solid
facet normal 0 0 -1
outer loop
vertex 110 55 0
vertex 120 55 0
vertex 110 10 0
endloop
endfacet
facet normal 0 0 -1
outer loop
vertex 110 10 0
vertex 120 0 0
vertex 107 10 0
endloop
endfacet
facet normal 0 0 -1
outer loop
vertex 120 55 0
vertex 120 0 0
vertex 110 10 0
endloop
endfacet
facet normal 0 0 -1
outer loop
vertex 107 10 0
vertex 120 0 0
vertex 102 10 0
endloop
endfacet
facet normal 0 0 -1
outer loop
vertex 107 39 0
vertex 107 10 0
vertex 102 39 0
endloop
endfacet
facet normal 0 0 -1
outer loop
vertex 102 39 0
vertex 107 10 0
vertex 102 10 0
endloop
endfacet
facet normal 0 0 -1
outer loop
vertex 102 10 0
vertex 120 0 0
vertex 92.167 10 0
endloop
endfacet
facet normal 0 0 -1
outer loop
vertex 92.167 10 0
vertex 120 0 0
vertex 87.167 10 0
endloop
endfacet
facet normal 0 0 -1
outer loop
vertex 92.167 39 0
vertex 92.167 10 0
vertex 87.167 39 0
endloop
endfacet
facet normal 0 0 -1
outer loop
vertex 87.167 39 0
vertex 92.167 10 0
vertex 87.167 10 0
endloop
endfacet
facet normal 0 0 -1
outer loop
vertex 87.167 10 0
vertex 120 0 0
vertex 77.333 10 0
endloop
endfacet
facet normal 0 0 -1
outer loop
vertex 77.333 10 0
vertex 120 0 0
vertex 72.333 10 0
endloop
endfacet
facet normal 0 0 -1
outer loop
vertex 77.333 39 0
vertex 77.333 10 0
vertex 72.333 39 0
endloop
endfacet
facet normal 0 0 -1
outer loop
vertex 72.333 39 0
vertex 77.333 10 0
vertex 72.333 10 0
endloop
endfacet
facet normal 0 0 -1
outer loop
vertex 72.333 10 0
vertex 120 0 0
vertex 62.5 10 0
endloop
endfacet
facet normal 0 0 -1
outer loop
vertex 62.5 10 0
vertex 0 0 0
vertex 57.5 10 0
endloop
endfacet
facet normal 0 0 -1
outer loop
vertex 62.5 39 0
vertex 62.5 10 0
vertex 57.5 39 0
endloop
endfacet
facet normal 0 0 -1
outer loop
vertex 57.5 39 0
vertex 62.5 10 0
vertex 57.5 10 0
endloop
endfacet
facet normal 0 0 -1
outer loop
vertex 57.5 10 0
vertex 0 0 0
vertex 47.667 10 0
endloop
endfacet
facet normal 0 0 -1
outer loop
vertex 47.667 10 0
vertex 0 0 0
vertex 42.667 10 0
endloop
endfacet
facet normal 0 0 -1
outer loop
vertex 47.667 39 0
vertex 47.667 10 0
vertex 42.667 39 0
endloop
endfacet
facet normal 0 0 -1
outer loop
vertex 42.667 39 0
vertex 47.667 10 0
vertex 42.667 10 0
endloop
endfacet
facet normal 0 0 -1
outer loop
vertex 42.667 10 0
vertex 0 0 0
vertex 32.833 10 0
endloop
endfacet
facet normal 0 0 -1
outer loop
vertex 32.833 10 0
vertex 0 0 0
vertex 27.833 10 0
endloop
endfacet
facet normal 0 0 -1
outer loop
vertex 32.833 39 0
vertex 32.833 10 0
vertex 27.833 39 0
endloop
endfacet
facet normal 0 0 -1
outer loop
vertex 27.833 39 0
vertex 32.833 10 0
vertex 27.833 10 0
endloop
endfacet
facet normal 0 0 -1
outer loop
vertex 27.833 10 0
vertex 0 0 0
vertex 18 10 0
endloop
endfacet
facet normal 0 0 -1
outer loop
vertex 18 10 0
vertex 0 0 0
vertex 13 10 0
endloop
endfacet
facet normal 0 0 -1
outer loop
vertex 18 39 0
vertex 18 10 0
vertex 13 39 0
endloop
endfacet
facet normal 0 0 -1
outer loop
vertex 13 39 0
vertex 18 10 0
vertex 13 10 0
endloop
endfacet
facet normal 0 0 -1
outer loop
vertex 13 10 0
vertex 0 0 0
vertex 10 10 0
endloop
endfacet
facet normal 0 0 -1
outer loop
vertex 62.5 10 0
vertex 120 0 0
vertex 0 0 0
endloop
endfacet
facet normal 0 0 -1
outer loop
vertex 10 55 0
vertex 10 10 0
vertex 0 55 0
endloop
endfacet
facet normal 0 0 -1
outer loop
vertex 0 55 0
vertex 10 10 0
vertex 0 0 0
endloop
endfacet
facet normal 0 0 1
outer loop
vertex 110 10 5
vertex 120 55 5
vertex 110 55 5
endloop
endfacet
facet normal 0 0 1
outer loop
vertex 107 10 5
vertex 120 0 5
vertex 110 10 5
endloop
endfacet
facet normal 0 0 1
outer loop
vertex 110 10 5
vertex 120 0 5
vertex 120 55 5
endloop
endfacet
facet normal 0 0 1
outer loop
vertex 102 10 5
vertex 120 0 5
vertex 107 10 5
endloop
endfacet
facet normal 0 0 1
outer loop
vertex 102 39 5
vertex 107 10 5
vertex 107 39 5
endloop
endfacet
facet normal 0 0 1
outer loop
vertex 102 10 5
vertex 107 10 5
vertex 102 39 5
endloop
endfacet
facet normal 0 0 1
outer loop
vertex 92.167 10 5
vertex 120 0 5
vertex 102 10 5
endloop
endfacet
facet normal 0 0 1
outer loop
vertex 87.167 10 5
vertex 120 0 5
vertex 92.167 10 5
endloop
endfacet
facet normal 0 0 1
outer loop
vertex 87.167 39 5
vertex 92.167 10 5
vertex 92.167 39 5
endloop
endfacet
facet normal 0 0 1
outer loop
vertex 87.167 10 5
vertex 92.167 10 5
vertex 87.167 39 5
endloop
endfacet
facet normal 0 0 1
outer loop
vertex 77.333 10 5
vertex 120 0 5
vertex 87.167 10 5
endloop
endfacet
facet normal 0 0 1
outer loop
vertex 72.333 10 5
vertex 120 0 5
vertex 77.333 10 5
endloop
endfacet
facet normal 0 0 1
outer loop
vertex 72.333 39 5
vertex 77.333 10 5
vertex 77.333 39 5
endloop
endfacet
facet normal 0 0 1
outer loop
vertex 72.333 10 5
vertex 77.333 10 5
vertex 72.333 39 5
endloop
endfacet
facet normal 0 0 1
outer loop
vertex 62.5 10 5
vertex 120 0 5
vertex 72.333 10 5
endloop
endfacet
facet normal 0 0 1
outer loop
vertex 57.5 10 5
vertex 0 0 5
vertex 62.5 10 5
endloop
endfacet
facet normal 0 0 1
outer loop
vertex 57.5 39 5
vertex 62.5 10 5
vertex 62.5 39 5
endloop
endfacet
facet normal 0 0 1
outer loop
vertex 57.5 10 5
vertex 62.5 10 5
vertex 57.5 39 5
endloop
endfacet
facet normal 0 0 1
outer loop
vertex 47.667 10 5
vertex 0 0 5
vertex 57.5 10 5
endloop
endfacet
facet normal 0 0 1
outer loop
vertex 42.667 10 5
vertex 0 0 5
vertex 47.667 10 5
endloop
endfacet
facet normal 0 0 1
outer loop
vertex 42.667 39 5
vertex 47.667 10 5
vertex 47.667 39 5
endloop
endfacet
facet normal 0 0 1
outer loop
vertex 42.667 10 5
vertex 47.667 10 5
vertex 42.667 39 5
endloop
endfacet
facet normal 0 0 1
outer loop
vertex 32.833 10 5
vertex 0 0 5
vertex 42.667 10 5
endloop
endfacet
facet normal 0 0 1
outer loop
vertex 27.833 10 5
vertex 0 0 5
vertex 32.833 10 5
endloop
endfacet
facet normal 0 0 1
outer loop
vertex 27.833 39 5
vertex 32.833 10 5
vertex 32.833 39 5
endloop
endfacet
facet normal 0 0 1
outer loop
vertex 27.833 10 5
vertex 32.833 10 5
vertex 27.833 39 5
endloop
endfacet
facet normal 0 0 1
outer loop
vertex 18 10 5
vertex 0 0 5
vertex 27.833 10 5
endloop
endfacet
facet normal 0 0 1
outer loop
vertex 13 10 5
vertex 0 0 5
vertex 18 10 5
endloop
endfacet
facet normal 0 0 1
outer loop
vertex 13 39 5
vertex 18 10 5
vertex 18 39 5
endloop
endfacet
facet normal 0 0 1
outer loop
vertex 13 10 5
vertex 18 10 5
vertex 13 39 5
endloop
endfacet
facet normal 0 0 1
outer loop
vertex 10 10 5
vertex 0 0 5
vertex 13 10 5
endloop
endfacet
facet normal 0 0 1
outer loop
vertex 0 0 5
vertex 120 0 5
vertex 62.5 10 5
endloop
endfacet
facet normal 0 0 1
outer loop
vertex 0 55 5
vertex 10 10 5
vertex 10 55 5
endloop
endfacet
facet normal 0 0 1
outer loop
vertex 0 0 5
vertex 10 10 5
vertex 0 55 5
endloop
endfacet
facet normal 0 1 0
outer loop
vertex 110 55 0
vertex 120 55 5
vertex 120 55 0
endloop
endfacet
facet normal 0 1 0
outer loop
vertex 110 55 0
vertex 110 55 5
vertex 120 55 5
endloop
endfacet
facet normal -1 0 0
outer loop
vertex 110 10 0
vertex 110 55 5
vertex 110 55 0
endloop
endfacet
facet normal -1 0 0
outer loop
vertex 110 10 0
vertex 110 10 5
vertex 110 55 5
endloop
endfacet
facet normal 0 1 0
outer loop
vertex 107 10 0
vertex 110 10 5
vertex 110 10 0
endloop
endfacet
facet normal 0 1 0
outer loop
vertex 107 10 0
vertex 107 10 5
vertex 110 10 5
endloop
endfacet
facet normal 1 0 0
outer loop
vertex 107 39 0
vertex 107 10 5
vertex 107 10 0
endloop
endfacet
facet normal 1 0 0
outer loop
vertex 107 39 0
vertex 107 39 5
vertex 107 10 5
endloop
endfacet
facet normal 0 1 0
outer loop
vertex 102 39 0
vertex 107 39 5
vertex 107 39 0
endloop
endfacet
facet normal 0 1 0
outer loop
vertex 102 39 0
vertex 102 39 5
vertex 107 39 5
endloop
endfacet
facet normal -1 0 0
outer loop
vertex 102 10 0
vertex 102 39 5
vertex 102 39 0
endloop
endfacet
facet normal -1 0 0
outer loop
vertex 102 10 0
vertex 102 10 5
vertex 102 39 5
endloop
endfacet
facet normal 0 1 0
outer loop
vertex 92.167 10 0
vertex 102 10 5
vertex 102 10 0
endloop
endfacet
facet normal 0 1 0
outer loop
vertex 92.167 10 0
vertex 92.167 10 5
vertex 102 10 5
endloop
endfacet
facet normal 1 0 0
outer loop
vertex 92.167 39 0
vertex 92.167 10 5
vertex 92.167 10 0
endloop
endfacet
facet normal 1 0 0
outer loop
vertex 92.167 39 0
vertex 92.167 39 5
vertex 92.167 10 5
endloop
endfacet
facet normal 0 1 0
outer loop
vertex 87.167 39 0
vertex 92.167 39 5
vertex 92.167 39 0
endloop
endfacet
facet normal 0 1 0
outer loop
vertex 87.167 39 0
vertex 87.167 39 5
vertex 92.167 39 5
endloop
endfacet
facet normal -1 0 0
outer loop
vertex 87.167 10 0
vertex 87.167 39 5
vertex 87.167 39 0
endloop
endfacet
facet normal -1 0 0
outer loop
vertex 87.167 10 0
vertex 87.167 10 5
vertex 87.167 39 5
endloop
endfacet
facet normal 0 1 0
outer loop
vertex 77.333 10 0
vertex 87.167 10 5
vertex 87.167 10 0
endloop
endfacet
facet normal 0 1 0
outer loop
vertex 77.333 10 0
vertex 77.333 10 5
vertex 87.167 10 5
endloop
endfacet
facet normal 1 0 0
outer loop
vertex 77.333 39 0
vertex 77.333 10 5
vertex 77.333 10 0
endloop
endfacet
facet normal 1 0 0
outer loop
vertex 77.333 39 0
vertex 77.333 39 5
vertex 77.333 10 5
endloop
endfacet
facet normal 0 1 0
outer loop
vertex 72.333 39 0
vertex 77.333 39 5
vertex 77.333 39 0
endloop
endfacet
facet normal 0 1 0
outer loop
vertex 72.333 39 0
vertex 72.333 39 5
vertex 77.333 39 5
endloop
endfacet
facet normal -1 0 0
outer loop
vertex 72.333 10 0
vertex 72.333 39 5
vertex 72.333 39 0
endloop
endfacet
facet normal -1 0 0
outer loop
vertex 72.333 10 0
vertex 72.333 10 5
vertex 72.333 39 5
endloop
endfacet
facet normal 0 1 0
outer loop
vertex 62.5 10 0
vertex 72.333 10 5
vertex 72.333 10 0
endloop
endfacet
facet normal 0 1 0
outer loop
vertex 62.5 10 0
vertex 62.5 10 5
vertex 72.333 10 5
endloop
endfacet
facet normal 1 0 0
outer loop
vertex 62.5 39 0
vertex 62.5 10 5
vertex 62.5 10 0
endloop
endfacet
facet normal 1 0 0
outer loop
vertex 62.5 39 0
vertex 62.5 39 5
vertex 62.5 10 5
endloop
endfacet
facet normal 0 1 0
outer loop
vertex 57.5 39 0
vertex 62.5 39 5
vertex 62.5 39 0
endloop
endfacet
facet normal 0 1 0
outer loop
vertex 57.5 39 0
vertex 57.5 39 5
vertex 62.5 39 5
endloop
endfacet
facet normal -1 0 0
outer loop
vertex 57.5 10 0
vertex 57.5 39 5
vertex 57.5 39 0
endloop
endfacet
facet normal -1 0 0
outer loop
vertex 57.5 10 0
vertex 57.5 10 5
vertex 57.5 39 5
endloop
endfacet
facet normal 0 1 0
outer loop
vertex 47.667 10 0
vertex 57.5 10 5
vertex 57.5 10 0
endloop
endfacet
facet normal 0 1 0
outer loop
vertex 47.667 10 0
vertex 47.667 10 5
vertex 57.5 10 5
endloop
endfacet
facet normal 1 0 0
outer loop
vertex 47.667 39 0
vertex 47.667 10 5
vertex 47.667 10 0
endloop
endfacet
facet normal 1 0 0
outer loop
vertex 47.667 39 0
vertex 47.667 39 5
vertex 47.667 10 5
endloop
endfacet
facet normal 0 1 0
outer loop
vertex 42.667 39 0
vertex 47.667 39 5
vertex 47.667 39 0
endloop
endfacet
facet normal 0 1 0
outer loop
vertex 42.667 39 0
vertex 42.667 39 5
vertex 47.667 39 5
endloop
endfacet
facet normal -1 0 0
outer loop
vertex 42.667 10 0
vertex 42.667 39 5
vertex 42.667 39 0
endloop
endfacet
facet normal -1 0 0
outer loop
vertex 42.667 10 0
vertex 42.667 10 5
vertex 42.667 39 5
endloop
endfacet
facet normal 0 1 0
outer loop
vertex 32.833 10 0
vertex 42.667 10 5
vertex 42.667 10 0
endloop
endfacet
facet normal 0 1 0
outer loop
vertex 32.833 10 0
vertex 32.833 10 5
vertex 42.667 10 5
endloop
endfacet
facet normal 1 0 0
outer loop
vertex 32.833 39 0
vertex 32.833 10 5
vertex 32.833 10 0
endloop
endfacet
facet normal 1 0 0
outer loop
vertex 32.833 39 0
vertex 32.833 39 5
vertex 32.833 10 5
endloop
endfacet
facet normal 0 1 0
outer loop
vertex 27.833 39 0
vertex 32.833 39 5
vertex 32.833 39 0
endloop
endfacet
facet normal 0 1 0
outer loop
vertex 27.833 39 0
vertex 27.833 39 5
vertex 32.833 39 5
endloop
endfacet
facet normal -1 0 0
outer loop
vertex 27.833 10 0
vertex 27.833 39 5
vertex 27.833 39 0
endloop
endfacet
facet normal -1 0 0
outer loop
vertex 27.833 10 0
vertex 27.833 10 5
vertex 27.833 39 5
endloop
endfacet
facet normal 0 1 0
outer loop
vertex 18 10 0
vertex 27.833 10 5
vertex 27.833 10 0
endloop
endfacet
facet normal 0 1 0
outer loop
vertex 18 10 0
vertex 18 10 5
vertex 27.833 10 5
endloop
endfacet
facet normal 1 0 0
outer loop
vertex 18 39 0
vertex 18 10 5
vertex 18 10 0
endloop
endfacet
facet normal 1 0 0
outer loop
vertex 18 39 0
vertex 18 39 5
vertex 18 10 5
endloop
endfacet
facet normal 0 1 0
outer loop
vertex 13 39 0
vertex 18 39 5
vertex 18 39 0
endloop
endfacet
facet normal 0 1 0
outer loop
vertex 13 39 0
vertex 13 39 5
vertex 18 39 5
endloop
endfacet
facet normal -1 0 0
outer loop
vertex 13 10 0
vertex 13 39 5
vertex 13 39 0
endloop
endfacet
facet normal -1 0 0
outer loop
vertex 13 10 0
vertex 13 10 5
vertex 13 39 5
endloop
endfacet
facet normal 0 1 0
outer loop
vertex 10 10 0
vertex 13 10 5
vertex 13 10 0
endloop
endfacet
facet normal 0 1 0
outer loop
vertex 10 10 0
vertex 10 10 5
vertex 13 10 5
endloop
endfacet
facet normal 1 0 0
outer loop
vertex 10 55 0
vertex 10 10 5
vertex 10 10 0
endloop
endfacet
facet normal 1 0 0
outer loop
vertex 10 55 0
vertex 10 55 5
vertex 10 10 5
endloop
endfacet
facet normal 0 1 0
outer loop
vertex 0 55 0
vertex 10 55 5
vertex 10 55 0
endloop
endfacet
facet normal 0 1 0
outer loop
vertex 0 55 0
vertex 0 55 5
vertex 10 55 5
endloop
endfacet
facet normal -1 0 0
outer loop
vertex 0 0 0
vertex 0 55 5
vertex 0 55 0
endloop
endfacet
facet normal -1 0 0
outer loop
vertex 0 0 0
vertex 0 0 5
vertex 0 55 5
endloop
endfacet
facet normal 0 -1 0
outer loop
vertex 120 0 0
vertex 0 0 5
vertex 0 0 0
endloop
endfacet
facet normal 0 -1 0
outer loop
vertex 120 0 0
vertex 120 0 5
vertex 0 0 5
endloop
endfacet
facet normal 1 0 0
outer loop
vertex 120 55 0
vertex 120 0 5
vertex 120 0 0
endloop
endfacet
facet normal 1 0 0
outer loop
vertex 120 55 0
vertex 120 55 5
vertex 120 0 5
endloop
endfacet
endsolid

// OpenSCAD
$fn = 32;

// ----------------------------------------------------------------------
// Guard grille: 7 slats over a 120 x 55 mm plate
// ----------------------------------------------------------------------

// --- parameters (mm) ---
profile_height = 5;       // extrusion height
profile_points = 36;      // points of the closed outline

profile = [[0, 0], [120, 0], [120, 55], [110, 55], [110, 10], [107, 10], [107, 39], [102, 39], [102, 10], [92.167, 10], [92.167, 39], [87.167, 39], [87.167, 10], [77.333, 10], [77.333, 39], [72.333, 39], [72.333, 10], [62.5, 10], [62.5, 39], [57.5, 39], [57.5, 10], [47.667, 10], [47.667, 39], [42.667, 39], [42.667, 10], [32.833, 10], [32.833, 39], [27.833, 39], [27.833, 10], [18, 10], [18, 39], [13, 39], [13, 10], [10, 10], [10, 55], [0, 55]];  // single closed polygon, 36 points, counter clockwise

// --- the one profile operation ---
linear_extrude(height = profile_height) polygon(points = profile);
